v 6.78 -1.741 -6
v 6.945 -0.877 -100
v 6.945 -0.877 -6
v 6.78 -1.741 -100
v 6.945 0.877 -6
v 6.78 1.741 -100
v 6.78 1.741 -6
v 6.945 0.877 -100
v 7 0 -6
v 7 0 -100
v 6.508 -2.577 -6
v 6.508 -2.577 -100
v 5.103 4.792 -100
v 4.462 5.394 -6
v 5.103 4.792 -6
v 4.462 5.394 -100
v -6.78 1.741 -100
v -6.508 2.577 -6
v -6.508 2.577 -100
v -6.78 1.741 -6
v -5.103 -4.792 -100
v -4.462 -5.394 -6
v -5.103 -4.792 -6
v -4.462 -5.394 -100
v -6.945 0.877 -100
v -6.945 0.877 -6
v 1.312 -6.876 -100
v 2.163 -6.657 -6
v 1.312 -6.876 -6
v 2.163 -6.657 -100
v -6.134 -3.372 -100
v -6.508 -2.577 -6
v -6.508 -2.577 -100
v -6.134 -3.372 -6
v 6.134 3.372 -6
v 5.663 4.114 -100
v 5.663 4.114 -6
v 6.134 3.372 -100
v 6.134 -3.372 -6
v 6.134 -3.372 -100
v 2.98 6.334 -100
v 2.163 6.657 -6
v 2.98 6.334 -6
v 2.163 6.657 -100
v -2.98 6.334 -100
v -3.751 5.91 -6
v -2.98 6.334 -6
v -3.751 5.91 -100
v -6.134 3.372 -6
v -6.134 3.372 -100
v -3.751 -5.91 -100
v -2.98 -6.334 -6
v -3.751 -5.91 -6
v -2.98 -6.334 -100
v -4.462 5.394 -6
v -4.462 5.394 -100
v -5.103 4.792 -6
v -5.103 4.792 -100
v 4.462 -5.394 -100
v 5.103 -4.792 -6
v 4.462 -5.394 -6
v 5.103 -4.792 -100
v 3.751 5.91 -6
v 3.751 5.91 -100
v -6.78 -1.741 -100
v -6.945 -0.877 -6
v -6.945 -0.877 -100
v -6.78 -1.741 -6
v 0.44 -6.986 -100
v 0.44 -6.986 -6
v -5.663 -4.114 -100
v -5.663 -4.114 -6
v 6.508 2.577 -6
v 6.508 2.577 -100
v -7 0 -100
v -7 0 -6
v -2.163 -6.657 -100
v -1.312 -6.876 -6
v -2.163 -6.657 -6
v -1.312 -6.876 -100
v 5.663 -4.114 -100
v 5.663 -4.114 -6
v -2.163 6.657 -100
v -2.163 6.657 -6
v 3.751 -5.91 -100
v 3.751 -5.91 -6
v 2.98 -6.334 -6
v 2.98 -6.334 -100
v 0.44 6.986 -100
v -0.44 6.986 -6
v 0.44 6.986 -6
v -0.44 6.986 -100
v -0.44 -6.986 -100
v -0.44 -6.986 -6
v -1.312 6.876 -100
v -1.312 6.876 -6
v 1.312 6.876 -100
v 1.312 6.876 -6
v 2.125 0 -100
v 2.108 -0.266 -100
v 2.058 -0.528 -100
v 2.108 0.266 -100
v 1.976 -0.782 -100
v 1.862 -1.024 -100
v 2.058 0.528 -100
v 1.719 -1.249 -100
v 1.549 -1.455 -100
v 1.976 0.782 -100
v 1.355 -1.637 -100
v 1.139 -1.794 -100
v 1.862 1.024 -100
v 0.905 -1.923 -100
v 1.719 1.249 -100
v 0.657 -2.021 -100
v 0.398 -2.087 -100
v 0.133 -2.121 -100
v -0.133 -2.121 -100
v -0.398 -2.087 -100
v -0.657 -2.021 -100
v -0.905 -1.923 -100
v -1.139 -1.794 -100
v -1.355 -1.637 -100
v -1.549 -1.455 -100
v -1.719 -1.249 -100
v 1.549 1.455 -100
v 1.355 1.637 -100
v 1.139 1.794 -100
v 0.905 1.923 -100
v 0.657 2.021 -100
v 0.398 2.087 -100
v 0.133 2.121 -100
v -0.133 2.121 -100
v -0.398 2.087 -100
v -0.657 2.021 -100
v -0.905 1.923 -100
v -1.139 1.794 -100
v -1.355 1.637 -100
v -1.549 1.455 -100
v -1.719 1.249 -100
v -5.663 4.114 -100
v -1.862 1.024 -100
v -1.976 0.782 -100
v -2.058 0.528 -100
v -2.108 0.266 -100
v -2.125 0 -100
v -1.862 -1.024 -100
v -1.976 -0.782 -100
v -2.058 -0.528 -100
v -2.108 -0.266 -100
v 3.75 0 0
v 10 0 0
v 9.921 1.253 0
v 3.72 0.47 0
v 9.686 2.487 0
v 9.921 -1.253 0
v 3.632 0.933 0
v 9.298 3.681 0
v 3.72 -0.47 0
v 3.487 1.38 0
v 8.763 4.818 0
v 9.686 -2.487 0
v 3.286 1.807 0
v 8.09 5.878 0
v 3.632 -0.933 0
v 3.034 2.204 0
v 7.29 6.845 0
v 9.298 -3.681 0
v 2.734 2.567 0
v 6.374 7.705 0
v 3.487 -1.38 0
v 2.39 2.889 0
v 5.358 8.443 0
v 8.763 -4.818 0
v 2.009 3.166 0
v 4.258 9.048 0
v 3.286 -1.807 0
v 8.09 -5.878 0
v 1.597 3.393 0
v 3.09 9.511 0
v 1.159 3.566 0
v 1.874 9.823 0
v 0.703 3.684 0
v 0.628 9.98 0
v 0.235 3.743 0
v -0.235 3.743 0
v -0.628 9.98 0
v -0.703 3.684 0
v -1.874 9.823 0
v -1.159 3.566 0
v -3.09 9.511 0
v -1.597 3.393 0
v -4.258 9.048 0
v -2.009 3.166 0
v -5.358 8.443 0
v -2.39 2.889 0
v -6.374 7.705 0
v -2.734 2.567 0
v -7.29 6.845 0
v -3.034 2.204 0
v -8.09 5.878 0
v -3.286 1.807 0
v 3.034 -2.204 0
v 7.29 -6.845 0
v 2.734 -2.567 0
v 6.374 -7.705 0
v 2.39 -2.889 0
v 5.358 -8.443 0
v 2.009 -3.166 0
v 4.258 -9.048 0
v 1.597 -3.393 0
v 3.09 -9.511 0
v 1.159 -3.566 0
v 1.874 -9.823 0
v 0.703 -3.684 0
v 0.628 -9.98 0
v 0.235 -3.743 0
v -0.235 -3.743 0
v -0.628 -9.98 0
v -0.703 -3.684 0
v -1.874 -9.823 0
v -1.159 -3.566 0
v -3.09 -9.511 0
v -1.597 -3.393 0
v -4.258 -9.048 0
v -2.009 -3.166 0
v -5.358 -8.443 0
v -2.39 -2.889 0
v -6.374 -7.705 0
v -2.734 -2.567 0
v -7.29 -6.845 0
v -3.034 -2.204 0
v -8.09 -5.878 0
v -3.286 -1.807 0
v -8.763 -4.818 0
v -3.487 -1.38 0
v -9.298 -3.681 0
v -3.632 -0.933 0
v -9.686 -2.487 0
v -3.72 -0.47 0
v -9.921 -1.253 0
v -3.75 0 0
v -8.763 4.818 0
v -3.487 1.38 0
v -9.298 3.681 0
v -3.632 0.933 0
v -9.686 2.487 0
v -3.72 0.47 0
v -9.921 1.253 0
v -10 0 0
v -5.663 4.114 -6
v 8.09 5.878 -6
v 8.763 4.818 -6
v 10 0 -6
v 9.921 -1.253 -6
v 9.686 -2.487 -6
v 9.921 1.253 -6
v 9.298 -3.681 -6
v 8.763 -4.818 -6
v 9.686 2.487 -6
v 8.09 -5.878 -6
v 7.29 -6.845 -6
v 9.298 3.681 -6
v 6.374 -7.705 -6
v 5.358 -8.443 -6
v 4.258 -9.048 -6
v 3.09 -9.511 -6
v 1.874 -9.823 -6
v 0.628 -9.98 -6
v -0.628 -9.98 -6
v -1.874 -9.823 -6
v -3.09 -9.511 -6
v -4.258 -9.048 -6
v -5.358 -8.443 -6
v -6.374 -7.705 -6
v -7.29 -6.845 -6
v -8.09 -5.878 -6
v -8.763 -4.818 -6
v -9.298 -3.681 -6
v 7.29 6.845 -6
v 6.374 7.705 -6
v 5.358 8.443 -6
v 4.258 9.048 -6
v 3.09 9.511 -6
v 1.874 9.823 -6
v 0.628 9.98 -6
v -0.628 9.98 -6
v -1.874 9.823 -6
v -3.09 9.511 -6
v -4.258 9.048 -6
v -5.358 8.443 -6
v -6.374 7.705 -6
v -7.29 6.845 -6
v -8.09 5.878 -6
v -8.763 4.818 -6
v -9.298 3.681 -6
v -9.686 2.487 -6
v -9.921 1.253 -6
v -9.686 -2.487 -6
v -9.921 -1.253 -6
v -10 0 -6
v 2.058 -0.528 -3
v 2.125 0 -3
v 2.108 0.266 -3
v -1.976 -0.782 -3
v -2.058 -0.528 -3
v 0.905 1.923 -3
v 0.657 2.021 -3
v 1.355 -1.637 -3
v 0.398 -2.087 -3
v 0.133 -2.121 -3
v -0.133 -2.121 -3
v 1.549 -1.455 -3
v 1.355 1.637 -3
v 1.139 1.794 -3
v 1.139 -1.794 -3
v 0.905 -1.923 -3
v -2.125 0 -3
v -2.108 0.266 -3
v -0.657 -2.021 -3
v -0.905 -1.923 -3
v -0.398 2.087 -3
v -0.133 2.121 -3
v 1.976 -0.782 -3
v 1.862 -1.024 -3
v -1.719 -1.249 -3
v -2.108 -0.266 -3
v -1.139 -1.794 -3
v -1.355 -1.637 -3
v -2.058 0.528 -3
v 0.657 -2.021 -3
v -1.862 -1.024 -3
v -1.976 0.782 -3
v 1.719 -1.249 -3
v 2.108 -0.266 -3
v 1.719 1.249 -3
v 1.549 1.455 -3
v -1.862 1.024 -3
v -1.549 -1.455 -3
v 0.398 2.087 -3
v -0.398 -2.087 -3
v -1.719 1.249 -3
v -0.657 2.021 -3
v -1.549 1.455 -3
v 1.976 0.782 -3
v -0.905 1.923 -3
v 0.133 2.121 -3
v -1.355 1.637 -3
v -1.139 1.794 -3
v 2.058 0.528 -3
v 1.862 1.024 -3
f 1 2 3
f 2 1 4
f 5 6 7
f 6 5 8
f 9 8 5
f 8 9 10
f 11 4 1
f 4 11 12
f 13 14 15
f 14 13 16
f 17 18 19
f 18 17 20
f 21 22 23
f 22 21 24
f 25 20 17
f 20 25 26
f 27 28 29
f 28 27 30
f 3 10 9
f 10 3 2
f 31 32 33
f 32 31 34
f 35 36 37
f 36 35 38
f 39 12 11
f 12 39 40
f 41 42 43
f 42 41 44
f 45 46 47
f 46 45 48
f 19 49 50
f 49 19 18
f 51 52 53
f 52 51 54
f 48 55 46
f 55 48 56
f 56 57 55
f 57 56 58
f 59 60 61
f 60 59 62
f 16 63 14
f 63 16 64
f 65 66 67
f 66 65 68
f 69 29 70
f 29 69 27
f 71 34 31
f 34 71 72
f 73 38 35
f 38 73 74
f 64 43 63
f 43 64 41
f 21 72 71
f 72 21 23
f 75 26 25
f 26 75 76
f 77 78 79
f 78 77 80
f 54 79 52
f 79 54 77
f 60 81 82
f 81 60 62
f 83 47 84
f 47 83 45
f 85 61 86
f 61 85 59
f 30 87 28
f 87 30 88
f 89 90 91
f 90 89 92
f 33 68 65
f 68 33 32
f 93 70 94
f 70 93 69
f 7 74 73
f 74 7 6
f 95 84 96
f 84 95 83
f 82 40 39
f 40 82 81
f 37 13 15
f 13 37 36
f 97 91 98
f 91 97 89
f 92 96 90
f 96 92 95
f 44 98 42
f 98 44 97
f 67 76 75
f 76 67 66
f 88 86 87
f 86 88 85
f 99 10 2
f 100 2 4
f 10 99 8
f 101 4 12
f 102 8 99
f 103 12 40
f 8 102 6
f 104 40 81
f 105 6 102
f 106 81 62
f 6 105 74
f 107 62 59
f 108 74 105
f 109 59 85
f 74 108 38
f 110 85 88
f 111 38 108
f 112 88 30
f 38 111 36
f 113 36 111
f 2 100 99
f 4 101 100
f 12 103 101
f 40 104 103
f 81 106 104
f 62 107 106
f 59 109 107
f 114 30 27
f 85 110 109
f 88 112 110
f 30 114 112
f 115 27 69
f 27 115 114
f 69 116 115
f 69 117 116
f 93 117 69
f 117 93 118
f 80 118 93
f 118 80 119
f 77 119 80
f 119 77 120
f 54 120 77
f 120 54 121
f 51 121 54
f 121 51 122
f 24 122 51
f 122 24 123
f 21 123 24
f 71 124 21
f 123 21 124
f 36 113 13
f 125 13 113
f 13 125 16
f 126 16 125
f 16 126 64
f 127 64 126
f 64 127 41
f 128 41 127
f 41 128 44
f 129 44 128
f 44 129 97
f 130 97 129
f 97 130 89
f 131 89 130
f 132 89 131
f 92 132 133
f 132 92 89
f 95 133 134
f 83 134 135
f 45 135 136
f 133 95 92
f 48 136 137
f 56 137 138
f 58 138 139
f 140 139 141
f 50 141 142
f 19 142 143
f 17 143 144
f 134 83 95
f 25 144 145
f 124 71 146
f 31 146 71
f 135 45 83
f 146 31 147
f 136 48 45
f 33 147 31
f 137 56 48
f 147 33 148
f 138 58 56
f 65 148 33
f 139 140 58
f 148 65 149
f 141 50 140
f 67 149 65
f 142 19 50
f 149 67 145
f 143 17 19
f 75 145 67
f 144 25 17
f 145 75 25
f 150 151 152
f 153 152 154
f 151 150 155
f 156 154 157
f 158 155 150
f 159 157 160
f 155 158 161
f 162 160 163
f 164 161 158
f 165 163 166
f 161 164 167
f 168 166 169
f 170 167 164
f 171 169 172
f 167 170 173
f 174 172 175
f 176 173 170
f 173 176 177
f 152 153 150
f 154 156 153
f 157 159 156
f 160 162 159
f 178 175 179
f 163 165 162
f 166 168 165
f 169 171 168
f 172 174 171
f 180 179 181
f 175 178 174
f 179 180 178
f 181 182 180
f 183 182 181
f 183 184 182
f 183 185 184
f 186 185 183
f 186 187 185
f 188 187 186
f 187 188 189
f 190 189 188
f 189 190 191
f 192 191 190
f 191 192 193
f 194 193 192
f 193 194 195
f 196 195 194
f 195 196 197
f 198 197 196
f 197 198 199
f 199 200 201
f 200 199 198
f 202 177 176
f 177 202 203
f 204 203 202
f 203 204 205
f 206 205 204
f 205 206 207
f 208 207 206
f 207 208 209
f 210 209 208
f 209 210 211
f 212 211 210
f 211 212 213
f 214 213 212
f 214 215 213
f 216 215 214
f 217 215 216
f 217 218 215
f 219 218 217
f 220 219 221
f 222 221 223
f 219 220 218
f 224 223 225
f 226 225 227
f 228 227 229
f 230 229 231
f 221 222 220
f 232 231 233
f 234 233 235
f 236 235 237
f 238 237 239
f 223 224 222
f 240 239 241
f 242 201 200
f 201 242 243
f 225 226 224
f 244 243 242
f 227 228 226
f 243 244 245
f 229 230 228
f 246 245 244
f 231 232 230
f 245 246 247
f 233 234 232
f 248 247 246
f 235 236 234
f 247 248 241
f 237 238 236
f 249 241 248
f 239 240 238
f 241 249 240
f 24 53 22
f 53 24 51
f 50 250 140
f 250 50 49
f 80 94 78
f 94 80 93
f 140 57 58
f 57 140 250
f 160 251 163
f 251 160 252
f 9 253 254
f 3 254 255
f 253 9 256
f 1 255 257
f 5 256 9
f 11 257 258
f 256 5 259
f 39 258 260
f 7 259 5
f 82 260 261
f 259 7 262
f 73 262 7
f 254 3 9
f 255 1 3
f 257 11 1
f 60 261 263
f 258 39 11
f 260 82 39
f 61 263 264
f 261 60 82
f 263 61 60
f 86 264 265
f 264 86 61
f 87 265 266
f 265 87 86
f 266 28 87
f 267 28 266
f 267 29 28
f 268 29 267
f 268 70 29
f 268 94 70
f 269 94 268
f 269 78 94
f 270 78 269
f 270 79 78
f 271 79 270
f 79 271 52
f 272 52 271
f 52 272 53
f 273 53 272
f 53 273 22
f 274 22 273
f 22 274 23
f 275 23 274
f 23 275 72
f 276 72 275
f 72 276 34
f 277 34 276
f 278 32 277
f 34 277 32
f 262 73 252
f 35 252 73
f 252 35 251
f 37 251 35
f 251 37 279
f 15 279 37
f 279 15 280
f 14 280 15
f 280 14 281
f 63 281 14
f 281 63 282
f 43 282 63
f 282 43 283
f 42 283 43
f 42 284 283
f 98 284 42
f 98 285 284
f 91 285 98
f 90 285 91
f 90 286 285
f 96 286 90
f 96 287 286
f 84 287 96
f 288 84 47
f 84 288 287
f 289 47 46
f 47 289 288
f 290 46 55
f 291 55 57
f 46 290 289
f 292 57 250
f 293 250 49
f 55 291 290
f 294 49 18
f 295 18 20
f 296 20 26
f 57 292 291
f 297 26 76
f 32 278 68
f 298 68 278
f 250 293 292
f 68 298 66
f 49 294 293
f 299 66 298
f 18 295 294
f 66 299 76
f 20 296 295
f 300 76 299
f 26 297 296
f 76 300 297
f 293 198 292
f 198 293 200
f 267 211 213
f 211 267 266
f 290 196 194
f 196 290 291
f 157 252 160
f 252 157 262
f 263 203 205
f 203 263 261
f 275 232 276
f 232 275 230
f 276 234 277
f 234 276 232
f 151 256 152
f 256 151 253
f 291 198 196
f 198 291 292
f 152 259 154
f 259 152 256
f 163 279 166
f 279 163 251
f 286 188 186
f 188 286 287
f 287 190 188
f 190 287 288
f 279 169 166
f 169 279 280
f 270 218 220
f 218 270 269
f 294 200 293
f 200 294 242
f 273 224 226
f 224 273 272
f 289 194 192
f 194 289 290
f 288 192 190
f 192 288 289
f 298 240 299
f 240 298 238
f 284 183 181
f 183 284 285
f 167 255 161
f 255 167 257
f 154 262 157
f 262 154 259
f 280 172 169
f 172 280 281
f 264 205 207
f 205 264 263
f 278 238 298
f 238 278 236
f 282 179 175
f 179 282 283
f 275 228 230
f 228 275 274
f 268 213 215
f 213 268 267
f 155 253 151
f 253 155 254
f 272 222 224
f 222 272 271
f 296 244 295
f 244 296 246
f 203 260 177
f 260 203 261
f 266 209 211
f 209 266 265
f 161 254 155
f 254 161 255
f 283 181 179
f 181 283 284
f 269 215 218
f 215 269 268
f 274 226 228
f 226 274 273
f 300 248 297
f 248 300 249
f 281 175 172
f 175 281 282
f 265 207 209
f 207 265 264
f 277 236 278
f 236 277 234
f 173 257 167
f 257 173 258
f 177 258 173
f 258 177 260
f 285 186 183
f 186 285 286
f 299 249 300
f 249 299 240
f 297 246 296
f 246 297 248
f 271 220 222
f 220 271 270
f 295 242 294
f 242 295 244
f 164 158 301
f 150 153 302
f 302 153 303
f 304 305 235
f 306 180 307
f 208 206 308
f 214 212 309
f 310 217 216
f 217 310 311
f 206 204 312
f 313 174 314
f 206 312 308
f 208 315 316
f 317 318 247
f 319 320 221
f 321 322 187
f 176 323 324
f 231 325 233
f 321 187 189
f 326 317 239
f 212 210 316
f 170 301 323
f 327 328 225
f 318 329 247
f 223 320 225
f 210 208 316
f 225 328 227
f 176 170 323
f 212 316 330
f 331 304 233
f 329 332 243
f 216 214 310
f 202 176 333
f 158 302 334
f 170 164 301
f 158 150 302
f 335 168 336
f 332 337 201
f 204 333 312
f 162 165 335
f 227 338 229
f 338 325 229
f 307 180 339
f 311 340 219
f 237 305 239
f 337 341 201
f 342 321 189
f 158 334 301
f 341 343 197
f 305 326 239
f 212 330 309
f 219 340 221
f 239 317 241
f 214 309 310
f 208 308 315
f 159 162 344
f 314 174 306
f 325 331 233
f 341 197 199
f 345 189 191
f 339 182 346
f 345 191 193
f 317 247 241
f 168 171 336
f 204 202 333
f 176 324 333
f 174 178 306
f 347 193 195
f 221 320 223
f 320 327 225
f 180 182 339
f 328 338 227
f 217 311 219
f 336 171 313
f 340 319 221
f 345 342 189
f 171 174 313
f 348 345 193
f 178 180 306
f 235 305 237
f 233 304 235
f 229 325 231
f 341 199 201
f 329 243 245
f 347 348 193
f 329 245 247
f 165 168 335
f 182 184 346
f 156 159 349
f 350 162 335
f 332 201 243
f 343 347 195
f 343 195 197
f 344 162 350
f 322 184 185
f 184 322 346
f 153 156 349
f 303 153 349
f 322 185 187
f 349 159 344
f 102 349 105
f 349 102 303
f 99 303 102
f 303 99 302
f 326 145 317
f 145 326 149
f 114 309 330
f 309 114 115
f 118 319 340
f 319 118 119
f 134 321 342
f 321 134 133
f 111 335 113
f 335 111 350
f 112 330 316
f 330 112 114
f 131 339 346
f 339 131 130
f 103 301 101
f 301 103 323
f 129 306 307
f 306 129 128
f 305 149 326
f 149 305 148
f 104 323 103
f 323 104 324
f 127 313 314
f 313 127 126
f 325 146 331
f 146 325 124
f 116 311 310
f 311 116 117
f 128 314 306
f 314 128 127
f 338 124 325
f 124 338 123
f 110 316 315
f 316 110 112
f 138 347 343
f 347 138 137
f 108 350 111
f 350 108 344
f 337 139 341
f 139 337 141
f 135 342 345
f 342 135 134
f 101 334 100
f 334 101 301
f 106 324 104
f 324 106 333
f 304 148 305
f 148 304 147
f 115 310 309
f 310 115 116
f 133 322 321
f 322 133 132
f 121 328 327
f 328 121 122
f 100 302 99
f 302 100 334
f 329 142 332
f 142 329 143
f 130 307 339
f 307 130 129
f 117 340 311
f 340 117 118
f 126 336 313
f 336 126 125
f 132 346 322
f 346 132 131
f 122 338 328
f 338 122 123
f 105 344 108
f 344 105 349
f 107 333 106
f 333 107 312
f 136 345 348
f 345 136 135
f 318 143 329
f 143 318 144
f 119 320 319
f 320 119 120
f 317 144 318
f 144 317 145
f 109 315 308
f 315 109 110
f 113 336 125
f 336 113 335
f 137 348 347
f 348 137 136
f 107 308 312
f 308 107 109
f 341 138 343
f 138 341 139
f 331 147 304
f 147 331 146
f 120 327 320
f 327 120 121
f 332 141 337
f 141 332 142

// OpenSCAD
$fn = 50;


difference() {
	union() {
		translate(v = [0, 0, -100.0000000000]) {
			cylinder(h = 100, r = 7.0000000000);
		}
		translate(v = [0, 0, -6.0000000000]) {
			cylinder(h = 6, r = 10.0000000000);
		}
	}
	union() {
		translate(v = [0, 0, 0]) {
			rotate(a = [0, 0, 0]) {
				difference() {
					union() {
						#translate(v = [0, 0, -100.0000000000]) {
							cylinder(h = 100, r = 2.0000000000);
						}
						#translate(v = [0, 0, -3]) {
							cylinder(h = 3, r = 7.0000000000, r1 = 2.1250000000, r2 = 3.7500000000);
						}
						#translate(v = [0, 0, -100.0000000000]) {
							cylinder(h = 100, r = 2.1250000000);
						}
						#translate(v = [0, 0, -100.0000000000]) {
							cylinder(h = 100, r = 2.0000000000);
						}
					}
					union();
				}
			}
		}
	}
}
